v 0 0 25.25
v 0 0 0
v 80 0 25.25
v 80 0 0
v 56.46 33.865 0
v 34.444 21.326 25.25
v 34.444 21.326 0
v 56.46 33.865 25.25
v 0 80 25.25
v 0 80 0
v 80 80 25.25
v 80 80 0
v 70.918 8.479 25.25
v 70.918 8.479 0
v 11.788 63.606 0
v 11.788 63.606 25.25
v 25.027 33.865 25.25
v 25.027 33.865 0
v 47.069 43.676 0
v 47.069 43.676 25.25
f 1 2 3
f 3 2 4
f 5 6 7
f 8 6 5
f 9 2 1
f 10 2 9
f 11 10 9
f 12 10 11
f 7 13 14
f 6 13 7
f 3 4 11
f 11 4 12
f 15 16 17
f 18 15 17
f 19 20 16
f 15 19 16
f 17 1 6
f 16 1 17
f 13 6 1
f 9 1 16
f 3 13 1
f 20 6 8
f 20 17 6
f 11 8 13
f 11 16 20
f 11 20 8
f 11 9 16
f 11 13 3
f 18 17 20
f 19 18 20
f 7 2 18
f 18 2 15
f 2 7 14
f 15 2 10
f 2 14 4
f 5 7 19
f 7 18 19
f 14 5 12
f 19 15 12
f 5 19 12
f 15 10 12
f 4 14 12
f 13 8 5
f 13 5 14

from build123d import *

# Parameters (mm, degrees)
ESQUISSE1_W             = 80
ESQUISSE1_H             = 80
BOSS_EXTRU_1_DEPTH      = 25.25
ENL_V_MAT_EXTRU_1_DEPTH = 25.25


with BuildPart() as part:
    # Esquisse1 → Boss.-Extru.1 (new body)
    with BuildSketch(Plane.XY):
        with Locations((40, 40)):
            Rectangle(ESQUISSE1_W, ESQUISSE1_H)
    extrude(amount=BOSS_EXTRU_1_DEPTH)

    # Esquisse2 → Enlèv. mat.-Extru.1 (cut)
    with BuildSketch(Plane.XY.offset(25.25)):
        Polygon((11.787944312, 63.60583742), (25.026815154, 33.864532302), (47.069224154, 43.676361494), align=None)
        Polygon((34.444148003, 21.326107713), (56.460422486, 33.864532302), (70.917940935, 8.478512531), align=None)
    extrude(amount=-ENL_V_MAT_EXTRU_1_DEPTH, mode=Mode.SUBTRACT)


solid = part.part
